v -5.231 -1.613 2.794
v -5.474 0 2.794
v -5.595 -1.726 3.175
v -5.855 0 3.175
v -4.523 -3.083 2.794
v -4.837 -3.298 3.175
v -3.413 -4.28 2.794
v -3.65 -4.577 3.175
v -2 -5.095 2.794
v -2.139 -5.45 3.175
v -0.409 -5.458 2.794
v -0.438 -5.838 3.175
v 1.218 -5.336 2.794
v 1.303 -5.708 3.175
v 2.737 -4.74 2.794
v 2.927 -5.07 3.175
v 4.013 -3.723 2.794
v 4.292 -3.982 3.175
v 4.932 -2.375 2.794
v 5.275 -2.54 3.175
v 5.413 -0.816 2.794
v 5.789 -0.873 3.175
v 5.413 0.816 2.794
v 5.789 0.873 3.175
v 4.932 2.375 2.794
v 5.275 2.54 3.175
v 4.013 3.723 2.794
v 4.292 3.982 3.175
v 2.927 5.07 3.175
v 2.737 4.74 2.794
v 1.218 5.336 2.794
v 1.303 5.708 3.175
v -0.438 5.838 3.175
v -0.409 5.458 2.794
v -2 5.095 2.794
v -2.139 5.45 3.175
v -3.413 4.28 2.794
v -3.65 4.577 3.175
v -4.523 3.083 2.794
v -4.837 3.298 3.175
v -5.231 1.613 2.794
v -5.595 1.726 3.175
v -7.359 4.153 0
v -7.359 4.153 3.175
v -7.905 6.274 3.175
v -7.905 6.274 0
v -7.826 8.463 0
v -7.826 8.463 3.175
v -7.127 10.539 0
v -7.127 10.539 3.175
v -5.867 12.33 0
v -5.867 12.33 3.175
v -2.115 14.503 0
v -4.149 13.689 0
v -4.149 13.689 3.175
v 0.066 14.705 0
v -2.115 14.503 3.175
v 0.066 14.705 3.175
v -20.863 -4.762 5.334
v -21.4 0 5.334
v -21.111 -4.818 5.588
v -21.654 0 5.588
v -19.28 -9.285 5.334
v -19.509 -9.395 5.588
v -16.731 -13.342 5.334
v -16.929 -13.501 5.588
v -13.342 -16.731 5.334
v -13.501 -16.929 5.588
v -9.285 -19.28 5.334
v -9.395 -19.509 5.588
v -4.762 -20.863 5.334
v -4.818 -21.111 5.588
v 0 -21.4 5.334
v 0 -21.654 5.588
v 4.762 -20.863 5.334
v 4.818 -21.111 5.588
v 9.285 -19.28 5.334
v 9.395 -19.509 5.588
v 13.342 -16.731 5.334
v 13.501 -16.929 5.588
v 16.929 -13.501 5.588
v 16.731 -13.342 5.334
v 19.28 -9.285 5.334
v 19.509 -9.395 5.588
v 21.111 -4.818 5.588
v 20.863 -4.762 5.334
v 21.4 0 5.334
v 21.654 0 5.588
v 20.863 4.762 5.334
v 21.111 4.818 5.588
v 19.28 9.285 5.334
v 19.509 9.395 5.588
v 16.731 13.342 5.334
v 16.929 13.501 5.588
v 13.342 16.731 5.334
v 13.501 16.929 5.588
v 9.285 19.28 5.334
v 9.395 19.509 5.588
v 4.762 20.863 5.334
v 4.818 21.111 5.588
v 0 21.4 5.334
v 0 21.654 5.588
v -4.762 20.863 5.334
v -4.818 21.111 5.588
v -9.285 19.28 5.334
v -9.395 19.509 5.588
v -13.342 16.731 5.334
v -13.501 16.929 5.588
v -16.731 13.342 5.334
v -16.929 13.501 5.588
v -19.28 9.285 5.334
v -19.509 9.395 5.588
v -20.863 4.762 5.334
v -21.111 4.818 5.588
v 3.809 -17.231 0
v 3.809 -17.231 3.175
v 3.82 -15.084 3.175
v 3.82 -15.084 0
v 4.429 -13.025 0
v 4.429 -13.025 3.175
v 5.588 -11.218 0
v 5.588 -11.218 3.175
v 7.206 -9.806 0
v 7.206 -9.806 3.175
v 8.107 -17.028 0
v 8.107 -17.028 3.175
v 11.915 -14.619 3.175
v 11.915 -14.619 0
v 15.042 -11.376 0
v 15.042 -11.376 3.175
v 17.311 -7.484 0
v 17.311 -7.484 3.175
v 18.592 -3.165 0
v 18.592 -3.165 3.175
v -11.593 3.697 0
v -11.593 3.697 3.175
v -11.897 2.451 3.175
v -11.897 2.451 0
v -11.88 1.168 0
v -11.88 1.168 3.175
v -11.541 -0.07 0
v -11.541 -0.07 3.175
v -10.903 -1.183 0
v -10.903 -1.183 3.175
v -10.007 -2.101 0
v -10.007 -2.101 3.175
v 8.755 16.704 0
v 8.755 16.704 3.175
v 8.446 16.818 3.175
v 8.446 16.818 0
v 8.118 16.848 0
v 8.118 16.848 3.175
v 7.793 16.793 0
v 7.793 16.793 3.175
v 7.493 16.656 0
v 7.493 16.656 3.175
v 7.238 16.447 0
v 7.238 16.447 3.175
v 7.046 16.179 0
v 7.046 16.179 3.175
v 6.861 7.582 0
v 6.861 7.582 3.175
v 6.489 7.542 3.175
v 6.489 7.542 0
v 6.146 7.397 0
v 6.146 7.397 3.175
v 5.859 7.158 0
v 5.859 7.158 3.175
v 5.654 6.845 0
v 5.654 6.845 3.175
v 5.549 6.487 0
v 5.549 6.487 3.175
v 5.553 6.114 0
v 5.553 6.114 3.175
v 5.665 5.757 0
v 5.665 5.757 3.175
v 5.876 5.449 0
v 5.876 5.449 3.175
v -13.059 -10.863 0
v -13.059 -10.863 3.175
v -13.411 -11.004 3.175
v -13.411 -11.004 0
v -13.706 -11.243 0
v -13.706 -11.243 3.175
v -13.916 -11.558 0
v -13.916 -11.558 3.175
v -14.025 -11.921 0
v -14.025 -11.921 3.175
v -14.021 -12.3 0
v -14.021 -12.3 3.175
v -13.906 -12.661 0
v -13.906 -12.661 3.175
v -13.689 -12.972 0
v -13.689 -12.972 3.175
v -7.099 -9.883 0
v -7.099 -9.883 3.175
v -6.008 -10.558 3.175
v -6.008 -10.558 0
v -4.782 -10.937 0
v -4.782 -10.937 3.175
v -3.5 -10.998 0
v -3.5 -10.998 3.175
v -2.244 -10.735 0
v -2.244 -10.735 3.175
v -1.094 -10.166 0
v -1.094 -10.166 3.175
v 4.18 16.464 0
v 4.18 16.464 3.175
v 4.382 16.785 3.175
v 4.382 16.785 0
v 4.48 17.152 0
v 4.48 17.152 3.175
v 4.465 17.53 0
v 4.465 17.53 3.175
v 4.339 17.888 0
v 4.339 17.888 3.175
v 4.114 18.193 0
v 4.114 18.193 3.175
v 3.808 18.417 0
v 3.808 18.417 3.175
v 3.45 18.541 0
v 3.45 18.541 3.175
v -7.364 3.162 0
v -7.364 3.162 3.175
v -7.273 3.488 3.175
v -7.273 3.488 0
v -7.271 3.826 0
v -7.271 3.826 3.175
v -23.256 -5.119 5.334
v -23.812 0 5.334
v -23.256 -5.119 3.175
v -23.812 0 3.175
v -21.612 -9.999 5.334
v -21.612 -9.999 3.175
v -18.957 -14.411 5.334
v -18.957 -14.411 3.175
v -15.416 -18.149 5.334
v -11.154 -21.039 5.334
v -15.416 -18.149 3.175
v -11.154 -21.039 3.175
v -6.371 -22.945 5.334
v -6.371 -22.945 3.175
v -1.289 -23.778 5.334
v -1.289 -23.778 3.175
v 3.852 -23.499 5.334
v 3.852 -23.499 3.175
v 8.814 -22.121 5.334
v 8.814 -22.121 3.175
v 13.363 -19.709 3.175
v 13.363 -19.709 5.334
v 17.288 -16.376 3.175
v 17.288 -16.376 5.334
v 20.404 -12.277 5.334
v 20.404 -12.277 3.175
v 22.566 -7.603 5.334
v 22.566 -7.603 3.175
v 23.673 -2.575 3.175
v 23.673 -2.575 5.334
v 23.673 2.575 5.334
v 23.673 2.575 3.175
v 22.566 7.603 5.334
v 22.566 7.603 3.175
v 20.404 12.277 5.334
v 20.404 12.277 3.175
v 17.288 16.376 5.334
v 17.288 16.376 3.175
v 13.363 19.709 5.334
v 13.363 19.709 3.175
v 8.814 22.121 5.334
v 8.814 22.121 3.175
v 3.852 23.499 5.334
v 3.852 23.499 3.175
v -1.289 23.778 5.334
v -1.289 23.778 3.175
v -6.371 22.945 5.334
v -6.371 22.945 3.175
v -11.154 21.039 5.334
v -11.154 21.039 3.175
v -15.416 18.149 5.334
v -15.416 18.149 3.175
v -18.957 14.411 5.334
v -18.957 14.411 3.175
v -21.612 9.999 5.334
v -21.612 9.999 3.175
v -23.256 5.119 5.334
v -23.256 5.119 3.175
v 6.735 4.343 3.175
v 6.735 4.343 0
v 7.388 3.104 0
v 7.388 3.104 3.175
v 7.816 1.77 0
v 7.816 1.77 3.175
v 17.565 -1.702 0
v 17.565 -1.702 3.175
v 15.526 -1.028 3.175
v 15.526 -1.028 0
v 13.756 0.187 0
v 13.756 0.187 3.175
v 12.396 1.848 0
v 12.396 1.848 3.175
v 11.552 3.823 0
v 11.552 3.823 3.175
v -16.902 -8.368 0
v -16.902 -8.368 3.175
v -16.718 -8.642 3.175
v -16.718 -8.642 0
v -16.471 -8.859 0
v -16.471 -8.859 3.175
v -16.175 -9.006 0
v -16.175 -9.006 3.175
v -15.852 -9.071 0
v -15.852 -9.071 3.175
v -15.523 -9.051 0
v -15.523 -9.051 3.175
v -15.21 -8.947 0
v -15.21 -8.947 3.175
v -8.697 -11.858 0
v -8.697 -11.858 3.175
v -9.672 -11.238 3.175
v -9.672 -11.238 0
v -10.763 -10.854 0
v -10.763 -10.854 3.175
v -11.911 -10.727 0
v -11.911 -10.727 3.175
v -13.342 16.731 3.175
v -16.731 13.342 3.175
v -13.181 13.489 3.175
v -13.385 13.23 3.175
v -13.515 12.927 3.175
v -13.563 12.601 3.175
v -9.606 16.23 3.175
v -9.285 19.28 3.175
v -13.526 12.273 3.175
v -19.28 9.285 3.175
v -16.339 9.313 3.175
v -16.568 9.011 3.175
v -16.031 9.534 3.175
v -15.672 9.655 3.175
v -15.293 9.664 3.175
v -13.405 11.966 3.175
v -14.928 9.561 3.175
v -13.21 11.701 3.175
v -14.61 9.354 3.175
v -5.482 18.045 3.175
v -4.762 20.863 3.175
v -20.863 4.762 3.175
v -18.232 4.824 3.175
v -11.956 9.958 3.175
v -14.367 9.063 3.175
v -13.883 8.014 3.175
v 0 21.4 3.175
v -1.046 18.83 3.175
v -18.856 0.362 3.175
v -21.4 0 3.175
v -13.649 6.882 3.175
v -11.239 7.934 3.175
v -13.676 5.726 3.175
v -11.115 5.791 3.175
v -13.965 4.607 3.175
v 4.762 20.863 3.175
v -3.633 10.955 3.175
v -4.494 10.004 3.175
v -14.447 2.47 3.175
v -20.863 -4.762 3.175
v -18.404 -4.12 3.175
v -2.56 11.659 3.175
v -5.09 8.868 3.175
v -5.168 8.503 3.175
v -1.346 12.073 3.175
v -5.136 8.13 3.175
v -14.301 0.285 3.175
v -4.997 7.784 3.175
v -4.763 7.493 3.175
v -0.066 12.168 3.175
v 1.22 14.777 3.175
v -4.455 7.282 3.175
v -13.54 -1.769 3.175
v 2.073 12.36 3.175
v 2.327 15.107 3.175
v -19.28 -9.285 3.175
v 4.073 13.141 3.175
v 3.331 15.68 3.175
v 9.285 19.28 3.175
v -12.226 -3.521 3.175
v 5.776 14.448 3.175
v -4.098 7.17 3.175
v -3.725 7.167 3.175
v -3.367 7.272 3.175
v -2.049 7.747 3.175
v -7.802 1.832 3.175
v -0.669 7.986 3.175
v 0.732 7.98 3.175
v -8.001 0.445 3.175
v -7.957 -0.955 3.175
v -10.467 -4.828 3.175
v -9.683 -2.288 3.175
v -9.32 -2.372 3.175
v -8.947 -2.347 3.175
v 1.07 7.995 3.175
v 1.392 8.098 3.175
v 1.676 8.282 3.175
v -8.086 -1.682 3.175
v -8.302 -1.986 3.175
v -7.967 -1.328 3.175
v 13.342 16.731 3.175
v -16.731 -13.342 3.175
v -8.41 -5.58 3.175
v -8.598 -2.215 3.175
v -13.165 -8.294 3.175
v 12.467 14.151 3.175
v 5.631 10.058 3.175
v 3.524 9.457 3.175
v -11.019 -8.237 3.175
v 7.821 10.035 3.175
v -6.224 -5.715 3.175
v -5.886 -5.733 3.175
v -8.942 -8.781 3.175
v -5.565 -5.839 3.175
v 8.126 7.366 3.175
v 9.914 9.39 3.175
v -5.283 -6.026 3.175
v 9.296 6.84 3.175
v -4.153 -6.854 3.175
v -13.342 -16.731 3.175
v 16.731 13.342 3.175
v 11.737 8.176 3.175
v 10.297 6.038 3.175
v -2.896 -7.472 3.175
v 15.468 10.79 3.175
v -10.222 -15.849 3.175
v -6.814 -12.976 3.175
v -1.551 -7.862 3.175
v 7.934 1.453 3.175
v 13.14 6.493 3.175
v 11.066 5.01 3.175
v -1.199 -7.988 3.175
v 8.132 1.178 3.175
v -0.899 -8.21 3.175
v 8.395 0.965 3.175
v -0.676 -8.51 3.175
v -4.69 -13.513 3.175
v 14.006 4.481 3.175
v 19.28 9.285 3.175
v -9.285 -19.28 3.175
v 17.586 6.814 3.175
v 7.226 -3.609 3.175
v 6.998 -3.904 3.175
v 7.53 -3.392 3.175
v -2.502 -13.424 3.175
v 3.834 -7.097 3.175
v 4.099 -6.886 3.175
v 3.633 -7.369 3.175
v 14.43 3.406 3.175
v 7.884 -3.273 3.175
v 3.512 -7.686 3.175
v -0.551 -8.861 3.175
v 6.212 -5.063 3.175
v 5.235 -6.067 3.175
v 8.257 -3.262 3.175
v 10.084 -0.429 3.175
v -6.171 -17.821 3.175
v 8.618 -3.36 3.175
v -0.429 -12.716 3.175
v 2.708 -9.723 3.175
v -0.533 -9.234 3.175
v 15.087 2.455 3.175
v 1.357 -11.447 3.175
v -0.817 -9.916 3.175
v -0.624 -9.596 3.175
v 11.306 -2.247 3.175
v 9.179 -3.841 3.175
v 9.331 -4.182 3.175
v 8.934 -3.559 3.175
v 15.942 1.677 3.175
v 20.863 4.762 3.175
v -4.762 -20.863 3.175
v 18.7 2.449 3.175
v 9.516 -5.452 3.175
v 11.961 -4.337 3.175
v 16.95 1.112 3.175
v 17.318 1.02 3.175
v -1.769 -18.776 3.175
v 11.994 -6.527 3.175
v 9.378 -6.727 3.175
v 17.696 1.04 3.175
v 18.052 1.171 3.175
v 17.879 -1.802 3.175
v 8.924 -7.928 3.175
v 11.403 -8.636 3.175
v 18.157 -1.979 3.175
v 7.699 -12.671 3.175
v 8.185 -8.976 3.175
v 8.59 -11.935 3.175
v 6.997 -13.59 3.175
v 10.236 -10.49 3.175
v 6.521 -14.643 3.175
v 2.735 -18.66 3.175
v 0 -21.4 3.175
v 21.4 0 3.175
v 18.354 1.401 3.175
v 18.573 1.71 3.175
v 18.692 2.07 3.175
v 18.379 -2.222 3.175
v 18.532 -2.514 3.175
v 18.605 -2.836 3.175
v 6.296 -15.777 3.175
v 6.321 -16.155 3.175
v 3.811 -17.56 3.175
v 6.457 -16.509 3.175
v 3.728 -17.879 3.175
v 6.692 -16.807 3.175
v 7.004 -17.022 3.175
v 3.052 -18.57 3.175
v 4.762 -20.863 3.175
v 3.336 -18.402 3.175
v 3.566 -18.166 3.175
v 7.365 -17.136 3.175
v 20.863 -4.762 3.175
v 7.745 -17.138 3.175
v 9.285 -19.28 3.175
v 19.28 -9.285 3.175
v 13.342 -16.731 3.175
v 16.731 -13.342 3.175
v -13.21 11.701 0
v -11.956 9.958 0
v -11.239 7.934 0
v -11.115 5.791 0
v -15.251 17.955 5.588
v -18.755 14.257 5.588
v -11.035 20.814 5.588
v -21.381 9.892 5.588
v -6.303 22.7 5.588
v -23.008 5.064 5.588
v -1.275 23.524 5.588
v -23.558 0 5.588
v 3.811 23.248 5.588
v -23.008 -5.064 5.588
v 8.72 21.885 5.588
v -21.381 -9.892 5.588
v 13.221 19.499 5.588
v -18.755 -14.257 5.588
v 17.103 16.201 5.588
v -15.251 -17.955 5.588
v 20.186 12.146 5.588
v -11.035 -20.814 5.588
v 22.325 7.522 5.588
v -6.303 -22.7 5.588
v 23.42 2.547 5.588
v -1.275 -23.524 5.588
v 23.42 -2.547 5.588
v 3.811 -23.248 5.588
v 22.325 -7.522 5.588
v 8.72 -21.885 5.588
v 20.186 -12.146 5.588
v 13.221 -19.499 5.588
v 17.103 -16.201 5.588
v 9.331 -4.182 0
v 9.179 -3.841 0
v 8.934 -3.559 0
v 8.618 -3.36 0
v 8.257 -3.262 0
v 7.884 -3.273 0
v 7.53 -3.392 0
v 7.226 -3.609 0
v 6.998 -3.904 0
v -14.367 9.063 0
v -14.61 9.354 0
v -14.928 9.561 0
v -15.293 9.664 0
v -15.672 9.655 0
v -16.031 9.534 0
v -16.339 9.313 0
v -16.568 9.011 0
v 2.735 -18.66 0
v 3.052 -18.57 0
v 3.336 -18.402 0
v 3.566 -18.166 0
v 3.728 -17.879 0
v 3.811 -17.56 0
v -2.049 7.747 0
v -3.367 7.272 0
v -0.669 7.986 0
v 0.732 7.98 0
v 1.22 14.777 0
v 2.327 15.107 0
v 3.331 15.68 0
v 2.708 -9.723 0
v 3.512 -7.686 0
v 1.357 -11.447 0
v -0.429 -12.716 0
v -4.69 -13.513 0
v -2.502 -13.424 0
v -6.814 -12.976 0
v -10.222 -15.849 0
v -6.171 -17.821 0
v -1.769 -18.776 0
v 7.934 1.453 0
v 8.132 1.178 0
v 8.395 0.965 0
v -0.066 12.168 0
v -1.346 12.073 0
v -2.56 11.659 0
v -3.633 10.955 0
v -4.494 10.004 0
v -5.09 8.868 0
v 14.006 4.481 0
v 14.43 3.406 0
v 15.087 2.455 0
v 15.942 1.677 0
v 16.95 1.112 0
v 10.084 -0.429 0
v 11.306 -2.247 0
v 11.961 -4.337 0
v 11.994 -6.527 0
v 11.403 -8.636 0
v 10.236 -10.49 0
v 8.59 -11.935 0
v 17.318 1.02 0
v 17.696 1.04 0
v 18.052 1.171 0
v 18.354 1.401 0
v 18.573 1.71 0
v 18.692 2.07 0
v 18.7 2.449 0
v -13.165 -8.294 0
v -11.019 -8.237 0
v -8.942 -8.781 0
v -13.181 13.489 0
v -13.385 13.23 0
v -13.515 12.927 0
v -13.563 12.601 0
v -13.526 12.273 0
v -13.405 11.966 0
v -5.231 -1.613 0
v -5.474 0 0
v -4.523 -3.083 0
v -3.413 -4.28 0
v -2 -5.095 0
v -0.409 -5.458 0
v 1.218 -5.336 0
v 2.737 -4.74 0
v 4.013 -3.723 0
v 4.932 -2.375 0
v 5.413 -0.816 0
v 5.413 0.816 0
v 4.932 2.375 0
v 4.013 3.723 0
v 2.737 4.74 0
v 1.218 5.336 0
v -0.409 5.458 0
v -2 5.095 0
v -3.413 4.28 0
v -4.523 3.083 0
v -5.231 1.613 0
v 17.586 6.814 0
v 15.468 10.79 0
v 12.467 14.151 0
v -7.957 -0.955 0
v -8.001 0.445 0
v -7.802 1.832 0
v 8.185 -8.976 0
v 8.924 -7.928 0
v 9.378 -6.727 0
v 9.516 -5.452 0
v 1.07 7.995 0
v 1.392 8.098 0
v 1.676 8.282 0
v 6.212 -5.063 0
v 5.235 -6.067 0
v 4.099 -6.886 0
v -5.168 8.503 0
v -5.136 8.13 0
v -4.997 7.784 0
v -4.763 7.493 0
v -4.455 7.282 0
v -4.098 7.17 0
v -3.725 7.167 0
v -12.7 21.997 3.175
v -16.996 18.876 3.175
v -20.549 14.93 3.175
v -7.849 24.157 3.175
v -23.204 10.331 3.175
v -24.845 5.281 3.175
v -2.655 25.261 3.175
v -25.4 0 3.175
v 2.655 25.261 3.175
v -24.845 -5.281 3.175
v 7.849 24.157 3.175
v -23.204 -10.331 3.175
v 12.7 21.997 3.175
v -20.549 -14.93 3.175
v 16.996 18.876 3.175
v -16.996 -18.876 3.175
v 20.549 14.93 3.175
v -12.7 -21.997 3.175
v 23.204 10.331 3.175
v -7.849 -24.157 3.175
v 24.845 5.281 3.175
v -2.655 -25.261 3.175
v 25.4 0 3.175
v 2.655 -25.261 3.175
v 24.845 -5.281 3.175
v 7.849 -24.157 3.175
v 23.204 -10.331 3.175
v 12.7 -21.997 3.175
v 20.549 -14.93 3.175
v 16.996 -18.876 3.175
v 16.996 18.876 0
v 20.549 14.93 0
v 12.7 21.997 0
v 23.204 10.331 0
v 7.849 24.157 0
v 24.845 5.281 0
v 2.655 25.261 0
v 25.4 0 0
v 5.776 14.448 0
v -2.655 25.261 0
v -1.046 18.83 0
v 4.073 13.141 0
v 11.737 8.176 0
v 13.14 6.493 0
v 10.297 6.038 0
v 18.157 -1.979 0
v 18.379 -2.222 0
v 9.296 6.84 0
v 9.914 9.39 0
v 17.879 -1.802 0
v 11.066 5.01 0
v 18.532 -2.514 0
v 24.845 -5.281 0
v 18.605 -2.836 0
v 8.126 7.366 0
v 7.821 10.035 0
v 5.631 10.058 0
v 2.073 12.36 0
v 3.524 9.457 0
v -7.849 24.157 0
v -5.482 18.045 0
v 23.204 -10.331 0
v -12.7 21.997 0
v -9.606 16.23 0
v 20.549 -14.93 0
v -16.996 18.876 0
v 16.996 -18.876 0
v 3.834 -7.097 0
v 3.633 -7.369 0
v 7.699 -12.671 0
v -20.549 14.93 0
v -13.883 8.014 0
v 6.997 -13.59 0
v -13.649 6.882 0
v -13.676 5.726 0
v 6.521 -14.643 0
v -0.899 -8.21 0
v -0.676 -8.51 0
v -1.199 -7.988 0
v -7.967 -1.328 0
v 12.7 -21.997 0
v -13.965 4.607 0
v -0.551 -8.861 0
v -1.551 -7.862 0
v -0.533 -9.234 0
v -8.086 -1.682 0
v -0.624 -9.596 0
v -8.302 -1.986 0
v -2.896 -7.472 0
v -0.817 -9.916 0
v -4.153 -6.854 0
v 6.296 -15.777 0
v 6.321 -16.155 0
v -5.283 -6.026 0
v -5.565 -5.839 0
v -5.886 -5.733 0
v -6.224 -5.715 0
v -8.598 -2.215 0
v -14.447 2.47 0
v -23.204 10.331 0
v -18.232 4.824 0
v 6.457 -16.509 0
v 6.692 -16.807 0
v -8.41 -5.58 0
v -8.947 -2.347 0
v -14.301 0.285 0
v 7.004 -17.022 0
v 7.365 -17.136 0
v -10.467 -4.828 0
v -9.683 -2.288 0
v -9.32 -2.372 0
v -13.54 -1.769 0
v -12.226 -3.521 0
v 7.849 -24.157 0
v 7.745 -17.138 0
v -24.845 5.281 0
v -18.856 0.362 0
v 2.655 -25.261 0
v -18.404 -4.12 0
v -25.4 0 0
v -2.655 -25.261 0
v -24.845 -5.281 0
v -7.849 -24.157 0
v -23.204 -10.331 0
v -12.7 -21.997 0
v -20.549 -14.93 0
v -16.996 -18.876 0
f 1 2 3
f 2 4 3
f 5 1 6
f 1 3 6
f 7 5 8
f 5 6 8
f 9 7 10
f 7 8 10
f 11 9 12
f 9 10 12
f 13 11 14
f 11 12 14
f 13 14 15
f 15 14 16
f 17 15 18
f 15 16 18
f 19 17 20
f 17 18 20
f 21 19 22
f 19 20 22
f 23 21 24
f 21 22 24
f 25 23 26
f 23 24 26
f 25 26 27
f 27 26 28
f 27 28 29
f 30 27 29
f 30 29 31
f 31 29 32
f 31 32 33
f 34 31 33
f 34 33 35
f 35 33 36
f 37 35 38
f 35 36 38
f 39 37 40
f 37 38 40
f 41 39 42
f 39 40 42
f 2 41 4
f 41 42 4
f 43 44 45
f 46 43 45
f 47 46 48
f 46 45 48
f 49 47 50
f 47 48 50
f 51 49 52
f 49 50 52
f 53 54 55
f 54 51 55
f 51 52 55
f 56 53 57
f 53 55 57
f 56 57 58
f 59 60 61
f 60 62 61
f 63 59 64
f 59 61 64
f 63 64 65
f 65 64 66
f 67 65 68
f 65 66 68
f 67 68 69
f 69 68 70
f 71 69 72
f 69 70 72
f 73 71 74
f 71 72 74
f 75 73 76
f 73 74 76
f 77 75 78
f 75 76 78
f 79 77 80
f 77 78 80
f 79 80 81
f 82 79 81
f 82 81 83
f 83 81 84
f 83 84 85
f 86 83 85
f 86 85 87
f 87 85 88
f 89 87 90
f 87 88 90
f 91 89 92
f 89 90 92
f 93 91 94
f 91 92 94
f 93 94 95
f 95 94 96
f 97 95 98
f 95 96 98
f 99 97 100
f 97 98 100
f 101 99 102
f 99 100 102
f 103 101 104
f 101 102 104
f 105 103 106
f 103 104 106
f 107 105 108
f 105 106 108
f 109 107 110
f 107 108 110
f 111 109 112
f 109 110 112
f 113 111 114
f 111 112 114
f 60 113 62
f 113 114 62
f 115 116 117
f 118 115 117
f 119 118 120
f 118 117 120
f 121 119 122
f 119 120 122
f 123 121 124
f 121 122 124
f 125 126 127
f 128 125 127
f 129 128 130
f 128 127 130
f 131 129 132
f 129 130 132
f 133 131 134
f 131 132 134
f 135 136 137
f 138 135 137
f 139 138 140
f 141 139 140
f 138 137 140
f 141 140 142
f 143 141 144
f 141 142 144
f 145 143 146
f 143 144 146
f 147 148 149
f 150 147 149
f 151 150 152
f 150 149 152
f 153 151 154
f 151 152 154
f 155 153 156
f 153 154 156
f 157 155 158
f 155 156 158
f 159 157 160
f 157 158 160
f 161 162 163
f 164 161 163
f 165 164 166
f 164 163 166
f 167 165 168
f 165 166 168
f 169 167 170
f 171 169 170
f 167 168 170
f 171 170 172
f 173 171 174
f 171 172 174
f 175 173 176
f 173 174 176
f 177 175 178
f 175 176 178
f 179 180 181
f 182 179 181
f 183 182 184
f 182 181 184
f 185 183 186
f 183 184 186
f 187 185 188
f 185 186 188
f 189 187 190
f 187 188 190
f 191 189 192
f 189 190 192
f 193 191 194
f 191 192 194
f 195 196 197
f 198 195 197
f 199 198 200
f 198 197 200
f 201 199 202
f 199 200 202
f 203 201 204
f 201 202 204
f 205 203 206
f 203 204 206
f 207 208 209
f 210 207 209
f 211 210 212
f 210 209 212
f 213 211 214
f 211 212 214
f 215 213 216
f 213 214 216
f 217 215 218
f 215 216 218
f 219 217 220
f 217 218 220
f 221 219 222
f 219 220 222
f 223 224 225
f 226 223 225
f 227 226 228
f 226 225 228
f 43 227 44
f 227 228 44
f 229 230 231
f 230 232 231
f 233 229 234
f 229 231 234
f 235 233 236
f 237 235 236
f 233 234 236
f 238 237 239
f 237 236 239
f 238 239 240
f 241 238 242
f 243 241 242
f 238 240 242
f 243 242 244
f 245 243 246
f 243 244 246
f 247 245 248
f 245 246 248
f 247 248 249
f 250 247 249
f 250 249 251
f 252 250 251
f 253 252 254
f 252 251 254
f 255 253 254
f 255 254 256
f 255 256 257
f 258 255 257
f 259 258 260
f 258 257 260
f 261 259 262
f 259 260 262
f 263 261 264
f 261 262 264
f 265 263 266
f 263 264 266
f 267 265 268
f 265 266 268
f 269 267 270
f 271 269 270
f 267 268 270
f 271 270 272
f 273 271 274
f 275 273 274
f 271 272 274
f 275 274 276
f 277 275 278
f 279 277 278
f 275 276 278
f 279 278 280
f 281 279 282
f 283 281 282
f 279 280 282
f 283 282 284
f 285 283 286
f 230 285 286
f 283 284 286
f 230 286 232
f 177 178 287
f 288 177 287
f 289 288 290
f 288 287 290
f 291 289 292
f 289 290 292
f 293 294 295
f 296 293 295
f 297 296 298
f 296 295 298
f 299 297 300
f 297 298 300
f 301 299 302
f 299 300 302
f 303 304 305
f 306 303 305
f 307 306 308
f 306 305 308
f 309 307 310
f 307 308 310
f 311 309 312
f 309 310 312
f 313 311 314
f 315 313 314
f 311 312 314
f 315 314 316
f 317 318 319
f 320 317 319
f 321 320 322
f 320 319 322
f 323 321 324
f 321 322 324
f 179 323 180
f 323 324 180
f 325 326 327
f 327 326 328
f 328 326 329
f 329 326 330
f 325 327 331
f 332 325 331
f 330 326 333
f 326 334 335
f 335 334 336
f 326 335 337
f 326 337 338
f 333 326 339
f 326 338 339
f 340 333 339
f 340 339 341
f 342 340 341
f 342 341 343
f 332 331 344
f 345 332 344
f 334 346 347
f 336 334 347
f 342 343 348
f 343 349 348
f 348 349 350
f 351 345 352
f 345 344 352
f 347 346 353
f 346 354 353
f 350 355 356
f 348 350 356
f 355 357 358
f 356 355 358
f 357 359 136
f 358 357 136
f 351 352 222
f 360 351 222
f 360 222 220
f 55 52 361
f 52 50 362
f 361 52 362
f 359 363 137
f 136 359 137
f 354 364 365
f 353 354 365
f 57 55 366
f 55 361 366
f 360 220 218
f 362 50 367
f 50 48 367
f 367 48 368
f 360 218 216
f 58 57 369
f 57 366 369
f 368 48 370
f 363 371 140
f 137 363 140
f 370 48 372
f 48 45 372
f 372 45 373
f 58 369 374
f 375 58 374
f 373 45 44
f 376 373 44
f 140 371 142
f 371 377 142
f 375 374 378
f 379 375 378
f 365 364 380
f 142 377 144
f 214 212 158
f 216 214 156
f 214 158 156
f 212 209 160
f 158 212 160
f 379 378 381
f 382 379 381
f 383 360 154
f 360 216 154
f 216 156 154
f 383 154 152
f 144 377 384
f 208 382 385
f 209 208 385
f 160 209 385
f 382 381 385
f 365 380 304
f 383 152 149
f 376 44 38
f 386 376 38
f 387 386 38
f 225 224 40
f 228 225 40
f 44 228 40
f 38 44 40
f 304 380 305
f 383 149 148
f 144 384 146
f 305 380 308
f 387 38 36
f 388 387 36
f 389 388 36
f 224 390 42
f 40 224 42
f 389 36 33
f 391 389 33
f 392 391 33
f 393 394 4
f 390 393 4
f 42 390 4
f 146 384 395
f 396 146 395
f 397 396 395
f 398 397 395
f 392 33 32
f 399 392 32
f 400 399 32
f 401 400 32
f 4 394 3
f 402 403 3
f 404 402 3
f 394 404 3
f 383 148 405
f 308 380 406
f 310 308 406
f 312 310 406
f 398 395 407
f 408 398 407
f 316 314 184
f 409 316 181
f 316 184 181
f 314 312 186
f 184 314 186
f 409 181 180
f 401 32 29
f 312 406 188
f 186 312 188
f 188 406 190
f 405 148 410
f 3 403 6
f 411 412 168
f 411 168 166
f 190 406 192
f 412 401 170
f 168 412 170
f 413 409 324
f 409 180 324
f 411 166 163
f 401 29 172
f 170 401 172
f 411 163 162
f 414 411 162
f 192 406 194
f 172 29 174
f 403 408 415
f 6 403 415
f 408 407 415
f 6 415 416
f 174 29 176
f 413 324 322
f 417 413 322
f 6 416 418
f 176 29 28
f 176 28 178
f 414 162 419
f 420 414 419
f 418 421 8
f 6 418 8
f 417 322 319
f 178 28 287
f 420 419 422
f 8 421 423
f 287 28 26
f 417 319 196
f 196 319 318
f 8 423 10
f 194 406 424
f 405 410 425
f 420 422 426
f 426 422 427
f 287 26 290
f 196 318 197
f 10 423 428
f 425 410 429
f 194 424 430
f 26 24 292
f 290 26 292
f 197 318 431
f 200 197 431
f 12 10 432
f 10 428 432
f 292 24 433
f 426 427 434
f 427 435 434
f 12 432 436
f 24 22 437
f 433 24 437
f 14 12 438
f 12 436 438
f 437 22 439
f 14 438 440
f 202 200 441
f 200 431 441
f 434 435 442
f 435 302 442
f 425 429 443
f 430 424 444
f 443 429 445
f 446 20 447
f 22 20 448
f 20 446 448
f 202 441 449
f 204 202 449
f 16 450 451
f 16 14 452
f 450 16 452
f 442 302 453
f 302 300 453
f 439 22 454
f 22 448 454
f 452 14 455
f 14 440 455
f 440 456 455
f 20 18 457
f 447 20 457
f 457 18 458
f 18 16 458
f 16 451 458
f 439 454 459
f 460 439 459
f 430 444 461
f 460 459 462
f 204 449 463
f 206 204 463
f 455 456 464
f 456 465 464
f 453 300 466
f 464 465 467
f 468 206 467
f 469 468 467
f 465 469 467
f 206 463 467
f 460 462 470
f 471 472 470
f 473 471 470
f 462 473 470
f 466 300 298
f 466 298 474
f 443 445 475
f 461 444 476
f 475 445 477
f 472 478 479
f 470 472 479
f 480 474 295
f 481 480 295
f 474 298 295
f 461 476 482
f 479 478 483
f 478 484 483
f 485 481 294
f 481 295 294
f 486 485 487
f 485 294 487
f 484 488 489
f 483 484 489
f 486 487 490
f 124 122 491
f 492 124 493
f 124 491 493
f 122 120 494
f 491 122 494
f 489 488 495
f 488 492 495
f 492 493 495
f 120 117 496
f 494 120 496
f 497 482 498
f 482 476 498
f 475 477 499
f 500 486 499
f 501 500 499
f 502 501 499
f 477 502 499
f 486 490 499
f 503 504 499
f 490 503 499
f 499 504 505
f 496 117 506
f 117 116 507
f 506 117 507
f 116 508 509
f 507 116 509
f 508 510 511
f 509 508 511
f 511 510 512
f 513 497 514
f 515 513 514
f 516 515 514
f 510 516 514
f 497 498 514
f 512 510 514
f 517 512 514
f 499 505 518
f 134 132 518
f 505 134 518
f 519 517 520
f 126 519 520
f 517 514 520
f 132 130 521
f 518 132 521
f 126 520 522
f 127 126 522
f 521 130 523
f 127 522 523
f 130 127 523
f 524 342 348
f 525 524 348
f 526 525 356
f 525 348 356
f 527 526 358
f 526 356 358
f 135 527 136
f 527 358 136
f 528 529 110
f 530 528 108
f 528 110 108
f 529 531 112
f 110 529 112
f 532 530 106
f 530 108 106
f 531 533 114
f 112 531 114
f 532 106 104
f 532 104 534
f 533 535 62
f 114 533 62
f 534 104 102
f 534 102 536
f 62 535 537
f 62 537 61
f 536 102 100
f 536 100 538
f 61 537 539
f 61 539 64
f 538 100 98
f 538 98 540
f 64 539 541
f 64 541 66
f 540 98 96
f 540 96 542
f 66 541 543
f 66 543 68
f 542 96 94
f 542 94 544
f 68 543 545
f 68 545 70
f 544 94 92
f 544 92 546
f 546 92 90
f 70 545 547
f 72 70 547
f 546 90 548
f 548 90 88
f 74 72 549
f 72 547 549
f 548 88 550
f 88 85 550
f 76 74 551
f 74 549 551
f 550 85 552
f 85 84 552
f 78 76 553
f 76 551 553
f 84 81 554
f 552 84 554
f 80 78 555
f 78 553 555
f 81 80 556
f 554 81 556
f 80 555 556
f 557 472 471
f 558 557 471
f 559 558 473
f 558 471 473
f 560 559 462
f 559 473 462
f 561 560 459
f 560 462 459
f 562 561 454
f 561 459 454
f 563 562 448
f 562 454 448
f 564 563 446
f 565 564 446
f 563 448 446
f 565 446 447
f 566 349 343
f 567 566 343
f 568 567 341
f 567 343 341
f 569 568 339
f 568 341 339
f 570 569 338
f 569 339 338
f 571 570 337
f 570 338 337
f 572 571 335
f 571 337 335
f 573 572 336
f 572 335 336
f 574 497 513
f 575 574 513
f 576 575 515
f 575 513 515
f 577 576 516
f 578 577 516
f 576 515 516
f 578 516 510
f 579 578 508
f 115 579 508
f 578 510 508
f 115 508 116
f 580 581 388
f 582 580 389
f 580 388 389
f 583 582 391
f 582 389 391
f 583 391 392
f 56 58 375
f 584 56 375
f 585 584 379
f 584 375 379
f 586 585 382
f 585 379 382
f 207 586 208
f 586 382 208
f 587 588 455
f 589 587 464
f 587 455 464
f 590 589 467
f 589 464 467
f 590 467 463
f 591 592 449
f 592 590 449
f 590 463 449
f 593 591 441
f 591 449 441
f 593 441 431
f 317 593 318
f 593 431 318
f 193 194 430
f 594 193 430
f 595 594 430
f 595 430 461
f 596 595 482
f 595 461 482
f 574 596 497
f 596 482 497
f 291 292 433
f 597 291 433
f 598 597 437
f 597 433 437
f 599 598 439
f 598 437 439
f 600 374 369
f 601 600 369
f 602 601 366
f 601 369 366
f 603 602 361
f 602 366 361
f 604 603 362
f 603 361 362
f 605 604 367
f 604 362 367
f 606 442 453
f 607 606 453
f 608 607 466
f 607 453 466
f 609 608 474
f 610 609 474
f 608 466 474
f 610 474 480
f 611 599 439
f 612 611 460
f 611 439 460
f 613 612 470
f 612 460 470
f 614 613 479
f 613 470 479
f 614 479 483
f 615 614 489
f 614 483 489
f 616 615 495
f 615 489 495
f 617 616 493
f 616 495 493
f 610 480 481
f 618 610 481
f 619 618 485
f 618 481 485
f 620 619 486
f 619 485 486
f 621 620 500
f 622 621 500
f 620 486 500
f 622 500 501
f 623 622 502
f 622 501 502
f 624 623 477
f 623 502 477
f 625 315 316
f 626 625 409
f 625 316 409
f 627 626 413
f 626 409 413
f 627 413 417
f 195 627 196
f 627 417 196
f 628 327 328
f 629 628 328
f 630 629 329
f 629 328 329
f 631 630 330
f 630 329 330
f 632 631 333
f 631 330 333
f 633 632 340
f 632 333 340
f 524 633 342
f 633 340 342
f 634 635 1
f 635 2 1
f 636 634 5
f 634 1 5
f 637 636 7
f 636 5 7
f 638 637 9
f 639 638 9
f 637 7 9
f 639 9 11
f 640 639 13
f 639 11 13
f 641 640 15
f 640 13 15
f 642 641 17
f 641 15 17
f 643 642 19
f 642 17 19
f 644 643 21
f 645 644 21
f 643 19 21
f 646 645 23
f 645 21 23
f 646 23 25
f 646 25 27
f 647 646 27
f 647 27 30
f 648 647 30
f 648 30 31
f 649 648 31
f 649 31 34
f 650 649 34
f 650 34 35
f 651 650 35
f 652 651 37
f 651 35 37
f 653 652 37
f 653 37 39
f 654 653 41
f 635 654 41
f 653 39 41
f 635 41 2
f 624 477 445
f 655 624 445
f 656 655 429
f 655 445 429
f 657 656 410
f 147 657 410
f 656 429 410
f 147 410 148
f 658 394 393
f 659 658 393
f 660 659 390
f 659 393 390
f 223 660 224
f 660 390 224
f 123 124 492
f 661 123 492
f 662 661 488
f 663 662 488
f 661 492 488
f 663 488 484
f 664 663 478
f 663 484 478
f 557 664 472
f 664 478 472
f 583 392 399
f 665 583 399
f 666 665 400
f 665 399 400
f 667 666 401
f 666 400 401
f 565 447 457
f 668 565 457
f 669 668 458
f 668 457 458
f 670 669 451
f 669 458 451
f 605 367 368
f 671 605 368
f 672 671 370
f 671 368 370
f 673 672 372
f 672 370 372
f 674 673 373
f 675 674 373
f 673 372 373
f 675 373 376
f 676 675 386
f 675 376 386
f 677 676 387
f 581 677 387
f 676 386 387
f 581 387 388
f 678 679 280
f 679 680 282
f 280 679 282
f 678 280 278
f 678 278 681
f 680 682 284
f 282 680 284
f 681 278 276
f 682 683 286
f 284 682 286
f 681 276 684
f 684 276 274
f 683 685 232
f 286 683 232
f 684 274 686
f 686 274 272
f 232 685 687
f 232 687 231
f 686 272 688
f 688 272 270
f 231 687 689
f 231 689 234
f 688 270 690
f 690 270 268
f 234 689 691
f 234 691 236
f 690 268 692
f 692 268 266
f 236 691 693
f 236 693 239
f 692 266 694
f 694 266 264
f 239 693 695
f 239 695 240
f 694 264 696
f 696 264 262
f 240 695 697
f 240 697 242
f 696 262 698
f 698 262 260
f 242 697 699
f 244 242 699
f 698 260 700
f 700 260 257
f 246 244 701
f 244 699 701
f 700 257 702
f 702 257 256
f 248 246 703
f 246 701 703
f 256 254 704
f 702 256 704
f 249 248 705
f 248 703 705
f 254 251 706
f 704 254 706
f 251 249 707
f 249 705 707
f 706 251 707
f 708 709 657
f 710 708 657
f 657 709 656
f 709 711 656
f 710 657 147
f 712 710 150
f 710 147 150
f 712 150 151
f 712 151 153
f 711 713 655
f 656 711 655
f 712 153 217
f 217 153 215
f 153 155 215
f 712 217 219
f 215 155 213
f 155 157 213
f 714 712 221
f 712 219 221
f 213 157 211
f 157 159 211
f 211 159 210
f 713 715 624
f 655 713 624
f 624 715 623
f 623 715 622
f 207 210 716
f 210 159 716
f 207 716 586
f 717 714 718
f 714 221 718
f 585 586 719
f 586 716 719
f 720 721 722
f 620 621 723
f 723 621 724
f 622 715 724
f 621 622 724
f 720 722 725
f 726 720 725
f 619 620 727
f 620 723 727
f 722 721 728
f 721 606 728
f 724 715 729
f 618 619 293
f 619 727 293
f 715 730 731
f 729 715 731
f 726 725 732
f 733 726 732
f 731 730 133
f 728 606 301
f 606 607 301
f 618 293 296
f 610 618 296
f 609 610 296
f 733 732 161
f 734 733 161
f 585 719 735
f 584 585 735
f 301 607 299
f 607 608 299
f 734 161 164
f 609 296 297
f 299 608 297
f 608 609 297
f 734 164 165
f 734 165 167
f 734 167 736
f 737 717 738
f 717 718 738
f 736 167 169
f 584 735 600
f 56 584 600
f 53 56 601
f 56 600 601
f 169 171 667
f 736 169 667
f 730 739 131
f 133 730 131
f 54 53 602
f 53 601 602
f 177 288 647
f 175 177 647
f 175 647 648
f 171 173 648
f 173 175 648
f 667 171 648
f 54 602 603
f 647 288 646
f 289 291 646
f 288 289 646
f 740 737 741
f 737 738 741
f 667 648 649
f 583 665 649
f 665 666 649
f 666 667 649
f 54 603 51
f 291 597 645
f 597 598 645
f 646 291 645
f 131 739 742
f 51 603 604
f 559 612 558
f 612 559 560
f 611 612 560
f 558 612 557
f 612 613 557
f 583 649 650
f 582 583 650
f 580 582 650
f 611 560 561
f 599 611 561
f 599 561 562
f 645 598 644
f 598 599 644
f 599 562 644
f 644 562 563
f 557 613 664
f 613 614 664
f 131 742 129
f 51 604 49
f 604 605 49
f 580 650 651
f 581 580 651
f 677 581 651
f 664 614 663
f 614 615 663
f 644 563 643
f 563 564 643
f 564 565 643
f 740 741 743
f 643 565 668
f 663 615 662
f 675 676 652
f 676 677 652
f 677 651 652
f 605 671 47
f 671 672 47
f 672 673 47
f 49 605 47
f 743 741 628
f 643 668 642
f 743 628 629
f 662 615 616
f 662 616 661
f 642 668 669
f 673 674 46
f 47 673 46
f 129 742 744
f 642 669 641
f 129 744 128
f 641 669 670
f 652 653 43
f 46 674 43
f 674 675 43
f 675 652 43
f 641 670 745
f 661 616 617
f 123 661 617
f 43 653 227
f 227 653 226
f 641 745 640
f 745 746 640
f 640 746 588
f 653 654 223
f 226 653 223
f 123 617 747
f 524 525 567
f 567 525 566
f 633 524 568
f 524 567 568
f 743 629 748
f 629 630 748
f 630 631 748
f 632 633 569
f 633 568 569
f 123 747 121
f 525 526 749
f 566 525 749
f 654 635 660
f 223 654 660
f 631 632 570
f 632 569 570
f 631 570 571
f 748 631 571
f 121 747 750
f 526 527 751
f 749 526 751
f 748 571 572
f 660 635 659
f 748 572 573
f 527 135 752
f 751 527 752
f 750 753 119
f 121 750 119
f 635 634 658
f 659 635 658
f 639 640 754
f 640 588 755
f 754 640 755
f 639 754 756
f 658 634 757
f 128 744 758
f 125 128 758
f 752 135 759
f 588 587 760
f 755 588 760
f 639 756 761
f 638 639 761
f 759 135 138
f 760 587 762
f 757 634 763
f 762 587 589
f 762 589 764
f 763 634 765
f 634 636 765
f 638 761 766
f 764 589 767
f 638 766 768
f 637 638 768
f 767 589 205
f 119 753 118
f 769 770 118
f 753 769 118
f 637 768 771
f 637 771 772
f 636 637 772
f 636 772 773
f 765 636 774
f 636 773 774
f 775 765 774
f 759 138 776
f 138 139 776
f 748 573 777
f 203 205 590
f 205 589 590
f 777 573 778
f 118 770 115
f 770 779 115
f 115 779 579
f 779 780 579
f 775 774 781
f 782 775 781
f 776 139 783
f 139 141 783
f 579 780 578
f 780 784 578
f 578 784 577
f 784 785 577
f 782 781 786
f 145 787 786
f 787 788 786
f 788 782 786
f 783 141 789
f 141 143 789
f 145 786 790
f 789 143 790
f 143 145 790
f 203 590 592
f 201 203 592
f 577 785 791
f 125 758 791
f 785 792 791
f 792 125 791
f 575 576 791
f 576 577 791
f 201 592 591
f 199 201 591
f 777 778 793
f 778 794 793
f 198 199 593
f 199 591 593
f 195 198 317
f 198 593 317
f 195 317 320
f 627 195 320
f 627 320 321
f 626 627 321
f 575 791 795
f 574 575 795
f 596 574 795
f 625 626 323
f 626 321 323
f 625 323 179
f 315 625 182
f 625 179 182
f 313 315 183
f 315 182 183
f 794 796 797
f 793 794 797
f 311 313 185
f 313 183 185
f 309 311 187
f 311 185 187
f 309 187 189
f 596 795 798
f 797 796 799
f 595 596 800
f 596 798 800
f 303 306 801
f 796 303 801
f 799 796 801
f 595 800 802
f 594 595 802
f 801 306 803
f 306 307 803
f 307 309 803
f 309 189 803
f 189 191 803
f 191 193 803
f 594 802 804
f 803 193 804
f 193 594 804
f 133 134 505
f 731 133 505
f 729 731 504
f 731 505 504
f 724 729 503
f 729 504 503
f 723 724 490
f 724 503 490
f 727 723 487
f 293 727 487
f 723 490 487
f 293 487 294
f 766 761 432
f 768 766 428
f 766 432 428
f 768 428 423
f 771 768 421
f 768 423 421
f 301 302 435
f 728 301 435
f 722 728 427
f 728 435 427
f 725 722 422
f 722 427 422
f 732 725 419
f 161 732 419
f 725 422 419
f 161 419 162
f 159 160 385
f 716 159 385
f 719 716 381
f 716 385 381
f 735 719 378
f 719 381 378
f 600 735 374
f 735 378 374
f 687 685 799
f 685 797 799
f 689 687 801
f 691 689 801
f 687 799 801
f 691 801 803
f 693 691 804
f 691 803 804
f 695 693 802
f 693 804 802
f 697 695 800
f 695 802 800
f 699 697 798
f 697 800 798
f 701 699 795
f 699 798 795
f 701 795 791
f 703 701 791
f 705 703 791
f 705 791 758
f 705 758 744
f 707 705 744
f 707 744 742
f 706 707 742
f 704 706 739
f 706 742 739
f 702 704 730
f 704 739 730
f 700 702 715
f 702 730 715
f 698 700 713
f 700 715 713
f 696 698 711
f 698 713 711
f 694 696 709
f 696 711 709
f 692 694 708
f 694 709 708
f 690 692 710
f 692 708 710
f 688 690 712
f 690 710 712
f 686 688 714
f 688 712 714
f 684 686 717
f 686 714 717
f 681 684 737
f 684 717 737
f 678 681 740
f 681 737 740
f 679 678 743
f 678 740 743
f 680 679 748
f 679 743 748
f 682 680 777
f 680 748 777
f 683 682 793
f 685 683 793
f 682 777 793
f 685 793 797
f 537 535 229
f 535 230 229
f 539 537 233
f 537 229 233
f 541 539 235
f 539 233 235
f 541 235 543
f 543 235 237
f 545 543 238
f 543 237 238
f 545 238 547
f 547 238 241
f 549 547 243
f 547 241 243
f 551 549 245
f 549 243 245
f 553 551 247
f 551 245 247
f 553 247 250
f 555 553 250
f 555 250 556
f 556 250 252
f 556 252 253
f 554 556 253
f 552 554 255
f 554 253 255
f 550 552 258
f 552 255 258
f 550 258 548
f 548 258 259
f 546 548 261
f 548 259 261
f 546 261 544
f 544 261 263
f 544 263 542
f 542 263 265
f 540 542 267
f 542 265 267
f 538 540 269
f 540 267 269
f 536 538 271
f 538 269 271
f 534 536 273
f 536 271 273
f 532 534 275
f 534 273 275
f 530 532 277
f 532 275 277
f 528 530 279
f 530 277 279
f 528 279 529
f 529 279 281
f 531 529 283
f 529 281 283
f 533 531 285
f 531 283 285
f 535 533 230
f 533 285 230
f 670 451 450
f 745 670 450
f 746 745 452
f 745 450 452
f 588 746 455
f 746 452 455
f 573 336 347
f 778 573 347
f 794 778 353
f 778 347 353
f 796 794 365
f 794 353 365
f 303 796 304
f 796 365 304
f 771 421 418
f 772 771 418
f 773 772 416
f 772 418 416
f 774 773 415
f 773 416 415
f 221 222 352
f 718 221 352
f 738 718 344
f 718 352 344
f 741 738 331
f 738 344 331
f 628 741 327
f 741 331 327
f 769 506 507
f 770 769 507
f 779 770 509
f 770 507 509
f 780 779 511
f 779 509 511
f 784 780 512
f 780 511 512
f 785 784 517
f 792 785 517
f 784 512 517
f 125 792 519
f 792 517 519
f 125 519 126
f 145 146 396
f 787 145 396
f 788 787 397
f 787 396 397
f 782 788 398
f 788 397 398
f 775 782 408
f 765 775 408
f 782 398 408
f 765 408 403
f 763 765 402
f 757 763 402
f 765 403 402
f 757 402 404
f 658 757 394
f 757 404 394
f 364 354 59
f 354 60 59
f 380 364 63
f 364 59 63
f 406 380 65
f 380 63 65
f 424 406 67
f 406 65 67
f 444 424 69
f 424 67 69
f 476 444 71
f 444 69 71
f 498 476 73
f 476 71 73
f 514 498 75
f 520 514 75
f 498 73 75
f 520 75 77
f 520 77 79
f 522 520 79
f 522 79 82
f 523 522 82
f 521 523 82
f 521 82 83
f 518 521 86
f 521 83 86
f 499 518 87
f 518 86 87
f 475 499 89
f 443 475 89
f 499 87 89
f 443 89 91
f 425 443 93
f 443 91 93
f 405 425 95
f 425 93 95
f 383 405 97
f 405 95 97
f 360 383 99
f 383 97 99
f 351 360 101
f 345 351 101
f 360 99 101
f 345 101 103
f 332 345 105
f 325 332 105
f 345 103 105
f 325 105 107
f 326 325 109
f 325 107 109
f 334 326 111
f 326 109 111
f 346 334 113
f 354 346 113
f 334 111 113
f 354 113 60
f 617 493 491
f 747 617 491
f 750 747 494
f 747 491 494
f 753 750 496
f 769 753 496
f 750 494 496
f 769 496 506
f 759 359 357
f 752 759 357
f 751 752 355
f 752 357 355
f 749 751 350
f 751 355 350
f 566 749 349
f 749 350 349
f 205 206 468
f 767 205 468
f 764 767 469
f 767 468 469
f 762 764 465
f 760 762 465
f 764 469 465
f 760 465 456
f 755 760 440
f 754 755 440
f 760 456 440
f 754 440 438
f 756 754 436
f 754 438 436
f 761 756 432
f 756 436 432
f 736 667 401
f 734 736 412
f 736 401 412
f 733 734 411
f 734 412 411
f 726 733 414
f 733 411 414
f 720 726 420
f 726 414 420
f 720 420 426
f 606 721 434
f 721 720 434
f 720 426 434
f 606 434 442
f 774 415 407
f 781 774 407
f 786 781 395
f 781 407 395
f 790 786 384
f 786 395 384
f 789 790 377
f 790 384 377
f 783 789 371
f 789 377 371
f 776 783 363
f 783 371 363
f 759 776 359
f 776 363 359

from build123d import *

# Parameters (mm, degrees)
F3_DEPTH = 25.4


with BuildPart() as f1:
    # F0 (on Front) → F1 (revolve)
    with BuildSketch(Plane.XZ):
        Polygon((-25.4, 0), (-5.4737, 0), (-5.4737, 2.794), (-5.8547, 3.175), (-21.3995, 3.175), (-21.3995, 5.334), (-21.6535, 5.588), (-23.5585, 5.588), (-23.8125, 5.334), (-23.8125, 3.175), (-25.4, 3.175), align=None)
    revolve(axis=Axis((0, 0, 7.17671), (0, 0, 1)))

    # F2 (on face) → F3 (cut)
    with BuildSketch(Plane.XY.offset(3.175)):
        with BuildLine():
            ThreePointArc((-7.956627, -0.95471), (-7.931805, 1.142742), (-7.363544, 3.1619))
            ThreePointArc((-7.363544, 3.1619), (-7.260521, 3.657138), (-7.358972, 4.153304))
            ThreePointArc((-7.358972, 4.153304), (-6.561517, 11.480324), (0.065952, 14.704886))
            ThreePointArc((0.065952, 14.704886), (2.327191, 15.1072), (4.180137, 16.464274))
            ThreePointArc((4.180137, 16.464274), (4.415643, 17.713968), (3.449856, 18.541285))
            ThreePointArc((3.449856, 18.541285), (-5.482341, 18.045073), (-13.180977, 13.488609))
            ThreePointArc((-13.180977, 13.488609), (-13.563205, 12.600734), (-13.209763, 11.701011))
            ThreePointArc((-13.209763, 11.701011), (-11.238972, 7.93406), (-11.593134, 3.697492))
            ThreePointArc((-11.593134, 3.697492), (-11.749757, 0.538425), (-10.006841, -2.100984))
            ThreePointArc((-10.006841, -2.100984), (-8.597816, -2.214519), (-7.956627, -0.95471))
        make_face()
        with BuildLine():
            ThreePointArc((-1.55075, -7.862224), (-3.537875, -7.190468), (-5.282606, -6.026065))
            ThreePointArc((-5.282606, -6.026065), (-5.721769, -5.775048), (-6.224075, -5.715357))
            ThreePointArc((-6.224075, -5.715357), (-12.946057, -2.692759), (-13.964798, 4.606784))
            ThreePointArc((-13.964798, 4.606784), (-13.64866, 6.881671), (-14.366722, 9.063287))
            ThreePointArc((-14.366722, 9.063287), (-15.482476, 9.673443), (-16.567745, 9.01058))
            ThreePointArc((-16.567745, 9.01058), (-18.856021, 0.362218), (-16.901576, -8.367645))
            ThreePointArc((-16.901576, -8.367645), (-16.17527, -9.005534), (-15.210364, -8.94742))
            ThreePointArc((-15.210364, -8.94742), (-11.018773, -8.237138), (-7.098999, -9.883138))
            ThreePointArc((-7.098999, -9.883138), (-4.142947, -11.0083), (-1.09413, -10.166311))
            ThreePointArc((-1.09413, -10.166311), (-0.550739, -8.861333), (-1.55075, -7.862224))
        make_face()
        with BuildLine():
            ThreePointArc((-3.366716, 7.272181), (-1.36425, 7.896721), (0.731685, 7.980227))
            ThreePointArc((0.731685, 7.980227), (1.23452, 8.035284), (1.67598, 8.28224))
            ThreePointArc((1.67598, 8.28224), (8.890816, 9.787989), (14.005558, 4.481336))
            ThreePointArc((14.005558, 4.481336), (15.086943, 2.455092), (16.950188, 1.112194))
            ThreePointArc((16.950188, 1.112194), (18.211493, 1.274391), (18.699874, 2.448564))
            ThreePointArc((18.699874, 2.448564), (15.467748, 10.790251), (8.755284, 16.704064))
            ThreePointArc((8.755284, 16.704064), (7.792749, 16.793215), (7.046282, 16.179043))
            ThreePointArc((7.046282, 16.179043), (4.072706, 13.140657), (-0.065952, 12.168314))
            ThreePointArc((-0.065952, 12.168314), (-3.118802, 11.341065), (-5.090438, 8.867832))
            ThreePointArc((-5.090438, 8.867832), (-4.763004, 7.492685), (-3.366716, 7.272181))
        make_face()
        with BuildLine():
            ThreePointArc((5.875882, 5.449165), (7.088652, 3.7377), (7.81575, 1.770152))
            ThreePointArc((7.81575, 1.770152), (8.023497, 1.308941), (8.394785, 0.965402))
            ThreePointArc((8.394785, 0.965402), (12.056344, -5.431014), (8.589959, -11.935269))
            ThreePointArc((8.589959, -11.935269), (6.997053, -13.58987), (6.295656, -15.7769))
            ThreePointArc((6.295656, -15.7769), (6.839679, -16.926351), (8.107302, -17.027989))
            ThreePointArc((8.107302, -17.027989), (15.041935, -11.376332), (18.59204, -3.16493))
            ThreePointArc((18.59204, -3.16493), (18.379389, -2.221956), (17.564605, -1.701813))
            ThreePointArc((17.564605, -1.701813), (13.756043, 0.187313), (11.552374, 3.82294))
            ThreePointArc((11.552374, 3.82294), (9.822231, 6.470739), (6.860777, 7.581605))
            ThreePointArc((6.860777, 7.581605), (5.654118, 6.845253), (5.875882, 5.449165))
        make_face()
        with BuildLine():
            ThreePointArc((6.998211, -3.904412), (5.745278, -5.586696), (4.098714, -6.886213))
            ThreePointArc((4.098714, -6.886213), (3.724274, -7.226314), (3.512283, -7.685589))
            ThreePointArc((3.512283, -7.685589), (-1.439586, -13.14454), (-8.696672, -11.857737))
            ThreePointArc((-8.696672, -11.857737), (-10.762526, -10.854093), (-13.059259, -10.862855))
            ThreePointArc((-13.059259, -10.862855), (-13.984339, -11.735451), (-13.689286, -12.97244))
            ThreePointArc((-13.689286, -12.97244), (-6.171321, -17.82121), (2.735229, -18.660098))
            ThreePointArc((2.735229, -18.660098), (3.566338, -18.166459), (3.809241, -17.230821))
            ThreePointArc((3.809241, -17.230821), (4.428996, -13.024891), (7.205711, -9.805607))
            ThreePointArc((7.205711, -9.805607), (9.189274, -7.341929), (9.330632, -4.182142))
            ThreePointArc((9.330632, -4.182142), (8.257441, -3.262086), (6.998211, -3.904412))
        make_face()
    extrude(amount=-F3_DEPTH, mode=Mode.SUBTRACT)


solid = f1.part
